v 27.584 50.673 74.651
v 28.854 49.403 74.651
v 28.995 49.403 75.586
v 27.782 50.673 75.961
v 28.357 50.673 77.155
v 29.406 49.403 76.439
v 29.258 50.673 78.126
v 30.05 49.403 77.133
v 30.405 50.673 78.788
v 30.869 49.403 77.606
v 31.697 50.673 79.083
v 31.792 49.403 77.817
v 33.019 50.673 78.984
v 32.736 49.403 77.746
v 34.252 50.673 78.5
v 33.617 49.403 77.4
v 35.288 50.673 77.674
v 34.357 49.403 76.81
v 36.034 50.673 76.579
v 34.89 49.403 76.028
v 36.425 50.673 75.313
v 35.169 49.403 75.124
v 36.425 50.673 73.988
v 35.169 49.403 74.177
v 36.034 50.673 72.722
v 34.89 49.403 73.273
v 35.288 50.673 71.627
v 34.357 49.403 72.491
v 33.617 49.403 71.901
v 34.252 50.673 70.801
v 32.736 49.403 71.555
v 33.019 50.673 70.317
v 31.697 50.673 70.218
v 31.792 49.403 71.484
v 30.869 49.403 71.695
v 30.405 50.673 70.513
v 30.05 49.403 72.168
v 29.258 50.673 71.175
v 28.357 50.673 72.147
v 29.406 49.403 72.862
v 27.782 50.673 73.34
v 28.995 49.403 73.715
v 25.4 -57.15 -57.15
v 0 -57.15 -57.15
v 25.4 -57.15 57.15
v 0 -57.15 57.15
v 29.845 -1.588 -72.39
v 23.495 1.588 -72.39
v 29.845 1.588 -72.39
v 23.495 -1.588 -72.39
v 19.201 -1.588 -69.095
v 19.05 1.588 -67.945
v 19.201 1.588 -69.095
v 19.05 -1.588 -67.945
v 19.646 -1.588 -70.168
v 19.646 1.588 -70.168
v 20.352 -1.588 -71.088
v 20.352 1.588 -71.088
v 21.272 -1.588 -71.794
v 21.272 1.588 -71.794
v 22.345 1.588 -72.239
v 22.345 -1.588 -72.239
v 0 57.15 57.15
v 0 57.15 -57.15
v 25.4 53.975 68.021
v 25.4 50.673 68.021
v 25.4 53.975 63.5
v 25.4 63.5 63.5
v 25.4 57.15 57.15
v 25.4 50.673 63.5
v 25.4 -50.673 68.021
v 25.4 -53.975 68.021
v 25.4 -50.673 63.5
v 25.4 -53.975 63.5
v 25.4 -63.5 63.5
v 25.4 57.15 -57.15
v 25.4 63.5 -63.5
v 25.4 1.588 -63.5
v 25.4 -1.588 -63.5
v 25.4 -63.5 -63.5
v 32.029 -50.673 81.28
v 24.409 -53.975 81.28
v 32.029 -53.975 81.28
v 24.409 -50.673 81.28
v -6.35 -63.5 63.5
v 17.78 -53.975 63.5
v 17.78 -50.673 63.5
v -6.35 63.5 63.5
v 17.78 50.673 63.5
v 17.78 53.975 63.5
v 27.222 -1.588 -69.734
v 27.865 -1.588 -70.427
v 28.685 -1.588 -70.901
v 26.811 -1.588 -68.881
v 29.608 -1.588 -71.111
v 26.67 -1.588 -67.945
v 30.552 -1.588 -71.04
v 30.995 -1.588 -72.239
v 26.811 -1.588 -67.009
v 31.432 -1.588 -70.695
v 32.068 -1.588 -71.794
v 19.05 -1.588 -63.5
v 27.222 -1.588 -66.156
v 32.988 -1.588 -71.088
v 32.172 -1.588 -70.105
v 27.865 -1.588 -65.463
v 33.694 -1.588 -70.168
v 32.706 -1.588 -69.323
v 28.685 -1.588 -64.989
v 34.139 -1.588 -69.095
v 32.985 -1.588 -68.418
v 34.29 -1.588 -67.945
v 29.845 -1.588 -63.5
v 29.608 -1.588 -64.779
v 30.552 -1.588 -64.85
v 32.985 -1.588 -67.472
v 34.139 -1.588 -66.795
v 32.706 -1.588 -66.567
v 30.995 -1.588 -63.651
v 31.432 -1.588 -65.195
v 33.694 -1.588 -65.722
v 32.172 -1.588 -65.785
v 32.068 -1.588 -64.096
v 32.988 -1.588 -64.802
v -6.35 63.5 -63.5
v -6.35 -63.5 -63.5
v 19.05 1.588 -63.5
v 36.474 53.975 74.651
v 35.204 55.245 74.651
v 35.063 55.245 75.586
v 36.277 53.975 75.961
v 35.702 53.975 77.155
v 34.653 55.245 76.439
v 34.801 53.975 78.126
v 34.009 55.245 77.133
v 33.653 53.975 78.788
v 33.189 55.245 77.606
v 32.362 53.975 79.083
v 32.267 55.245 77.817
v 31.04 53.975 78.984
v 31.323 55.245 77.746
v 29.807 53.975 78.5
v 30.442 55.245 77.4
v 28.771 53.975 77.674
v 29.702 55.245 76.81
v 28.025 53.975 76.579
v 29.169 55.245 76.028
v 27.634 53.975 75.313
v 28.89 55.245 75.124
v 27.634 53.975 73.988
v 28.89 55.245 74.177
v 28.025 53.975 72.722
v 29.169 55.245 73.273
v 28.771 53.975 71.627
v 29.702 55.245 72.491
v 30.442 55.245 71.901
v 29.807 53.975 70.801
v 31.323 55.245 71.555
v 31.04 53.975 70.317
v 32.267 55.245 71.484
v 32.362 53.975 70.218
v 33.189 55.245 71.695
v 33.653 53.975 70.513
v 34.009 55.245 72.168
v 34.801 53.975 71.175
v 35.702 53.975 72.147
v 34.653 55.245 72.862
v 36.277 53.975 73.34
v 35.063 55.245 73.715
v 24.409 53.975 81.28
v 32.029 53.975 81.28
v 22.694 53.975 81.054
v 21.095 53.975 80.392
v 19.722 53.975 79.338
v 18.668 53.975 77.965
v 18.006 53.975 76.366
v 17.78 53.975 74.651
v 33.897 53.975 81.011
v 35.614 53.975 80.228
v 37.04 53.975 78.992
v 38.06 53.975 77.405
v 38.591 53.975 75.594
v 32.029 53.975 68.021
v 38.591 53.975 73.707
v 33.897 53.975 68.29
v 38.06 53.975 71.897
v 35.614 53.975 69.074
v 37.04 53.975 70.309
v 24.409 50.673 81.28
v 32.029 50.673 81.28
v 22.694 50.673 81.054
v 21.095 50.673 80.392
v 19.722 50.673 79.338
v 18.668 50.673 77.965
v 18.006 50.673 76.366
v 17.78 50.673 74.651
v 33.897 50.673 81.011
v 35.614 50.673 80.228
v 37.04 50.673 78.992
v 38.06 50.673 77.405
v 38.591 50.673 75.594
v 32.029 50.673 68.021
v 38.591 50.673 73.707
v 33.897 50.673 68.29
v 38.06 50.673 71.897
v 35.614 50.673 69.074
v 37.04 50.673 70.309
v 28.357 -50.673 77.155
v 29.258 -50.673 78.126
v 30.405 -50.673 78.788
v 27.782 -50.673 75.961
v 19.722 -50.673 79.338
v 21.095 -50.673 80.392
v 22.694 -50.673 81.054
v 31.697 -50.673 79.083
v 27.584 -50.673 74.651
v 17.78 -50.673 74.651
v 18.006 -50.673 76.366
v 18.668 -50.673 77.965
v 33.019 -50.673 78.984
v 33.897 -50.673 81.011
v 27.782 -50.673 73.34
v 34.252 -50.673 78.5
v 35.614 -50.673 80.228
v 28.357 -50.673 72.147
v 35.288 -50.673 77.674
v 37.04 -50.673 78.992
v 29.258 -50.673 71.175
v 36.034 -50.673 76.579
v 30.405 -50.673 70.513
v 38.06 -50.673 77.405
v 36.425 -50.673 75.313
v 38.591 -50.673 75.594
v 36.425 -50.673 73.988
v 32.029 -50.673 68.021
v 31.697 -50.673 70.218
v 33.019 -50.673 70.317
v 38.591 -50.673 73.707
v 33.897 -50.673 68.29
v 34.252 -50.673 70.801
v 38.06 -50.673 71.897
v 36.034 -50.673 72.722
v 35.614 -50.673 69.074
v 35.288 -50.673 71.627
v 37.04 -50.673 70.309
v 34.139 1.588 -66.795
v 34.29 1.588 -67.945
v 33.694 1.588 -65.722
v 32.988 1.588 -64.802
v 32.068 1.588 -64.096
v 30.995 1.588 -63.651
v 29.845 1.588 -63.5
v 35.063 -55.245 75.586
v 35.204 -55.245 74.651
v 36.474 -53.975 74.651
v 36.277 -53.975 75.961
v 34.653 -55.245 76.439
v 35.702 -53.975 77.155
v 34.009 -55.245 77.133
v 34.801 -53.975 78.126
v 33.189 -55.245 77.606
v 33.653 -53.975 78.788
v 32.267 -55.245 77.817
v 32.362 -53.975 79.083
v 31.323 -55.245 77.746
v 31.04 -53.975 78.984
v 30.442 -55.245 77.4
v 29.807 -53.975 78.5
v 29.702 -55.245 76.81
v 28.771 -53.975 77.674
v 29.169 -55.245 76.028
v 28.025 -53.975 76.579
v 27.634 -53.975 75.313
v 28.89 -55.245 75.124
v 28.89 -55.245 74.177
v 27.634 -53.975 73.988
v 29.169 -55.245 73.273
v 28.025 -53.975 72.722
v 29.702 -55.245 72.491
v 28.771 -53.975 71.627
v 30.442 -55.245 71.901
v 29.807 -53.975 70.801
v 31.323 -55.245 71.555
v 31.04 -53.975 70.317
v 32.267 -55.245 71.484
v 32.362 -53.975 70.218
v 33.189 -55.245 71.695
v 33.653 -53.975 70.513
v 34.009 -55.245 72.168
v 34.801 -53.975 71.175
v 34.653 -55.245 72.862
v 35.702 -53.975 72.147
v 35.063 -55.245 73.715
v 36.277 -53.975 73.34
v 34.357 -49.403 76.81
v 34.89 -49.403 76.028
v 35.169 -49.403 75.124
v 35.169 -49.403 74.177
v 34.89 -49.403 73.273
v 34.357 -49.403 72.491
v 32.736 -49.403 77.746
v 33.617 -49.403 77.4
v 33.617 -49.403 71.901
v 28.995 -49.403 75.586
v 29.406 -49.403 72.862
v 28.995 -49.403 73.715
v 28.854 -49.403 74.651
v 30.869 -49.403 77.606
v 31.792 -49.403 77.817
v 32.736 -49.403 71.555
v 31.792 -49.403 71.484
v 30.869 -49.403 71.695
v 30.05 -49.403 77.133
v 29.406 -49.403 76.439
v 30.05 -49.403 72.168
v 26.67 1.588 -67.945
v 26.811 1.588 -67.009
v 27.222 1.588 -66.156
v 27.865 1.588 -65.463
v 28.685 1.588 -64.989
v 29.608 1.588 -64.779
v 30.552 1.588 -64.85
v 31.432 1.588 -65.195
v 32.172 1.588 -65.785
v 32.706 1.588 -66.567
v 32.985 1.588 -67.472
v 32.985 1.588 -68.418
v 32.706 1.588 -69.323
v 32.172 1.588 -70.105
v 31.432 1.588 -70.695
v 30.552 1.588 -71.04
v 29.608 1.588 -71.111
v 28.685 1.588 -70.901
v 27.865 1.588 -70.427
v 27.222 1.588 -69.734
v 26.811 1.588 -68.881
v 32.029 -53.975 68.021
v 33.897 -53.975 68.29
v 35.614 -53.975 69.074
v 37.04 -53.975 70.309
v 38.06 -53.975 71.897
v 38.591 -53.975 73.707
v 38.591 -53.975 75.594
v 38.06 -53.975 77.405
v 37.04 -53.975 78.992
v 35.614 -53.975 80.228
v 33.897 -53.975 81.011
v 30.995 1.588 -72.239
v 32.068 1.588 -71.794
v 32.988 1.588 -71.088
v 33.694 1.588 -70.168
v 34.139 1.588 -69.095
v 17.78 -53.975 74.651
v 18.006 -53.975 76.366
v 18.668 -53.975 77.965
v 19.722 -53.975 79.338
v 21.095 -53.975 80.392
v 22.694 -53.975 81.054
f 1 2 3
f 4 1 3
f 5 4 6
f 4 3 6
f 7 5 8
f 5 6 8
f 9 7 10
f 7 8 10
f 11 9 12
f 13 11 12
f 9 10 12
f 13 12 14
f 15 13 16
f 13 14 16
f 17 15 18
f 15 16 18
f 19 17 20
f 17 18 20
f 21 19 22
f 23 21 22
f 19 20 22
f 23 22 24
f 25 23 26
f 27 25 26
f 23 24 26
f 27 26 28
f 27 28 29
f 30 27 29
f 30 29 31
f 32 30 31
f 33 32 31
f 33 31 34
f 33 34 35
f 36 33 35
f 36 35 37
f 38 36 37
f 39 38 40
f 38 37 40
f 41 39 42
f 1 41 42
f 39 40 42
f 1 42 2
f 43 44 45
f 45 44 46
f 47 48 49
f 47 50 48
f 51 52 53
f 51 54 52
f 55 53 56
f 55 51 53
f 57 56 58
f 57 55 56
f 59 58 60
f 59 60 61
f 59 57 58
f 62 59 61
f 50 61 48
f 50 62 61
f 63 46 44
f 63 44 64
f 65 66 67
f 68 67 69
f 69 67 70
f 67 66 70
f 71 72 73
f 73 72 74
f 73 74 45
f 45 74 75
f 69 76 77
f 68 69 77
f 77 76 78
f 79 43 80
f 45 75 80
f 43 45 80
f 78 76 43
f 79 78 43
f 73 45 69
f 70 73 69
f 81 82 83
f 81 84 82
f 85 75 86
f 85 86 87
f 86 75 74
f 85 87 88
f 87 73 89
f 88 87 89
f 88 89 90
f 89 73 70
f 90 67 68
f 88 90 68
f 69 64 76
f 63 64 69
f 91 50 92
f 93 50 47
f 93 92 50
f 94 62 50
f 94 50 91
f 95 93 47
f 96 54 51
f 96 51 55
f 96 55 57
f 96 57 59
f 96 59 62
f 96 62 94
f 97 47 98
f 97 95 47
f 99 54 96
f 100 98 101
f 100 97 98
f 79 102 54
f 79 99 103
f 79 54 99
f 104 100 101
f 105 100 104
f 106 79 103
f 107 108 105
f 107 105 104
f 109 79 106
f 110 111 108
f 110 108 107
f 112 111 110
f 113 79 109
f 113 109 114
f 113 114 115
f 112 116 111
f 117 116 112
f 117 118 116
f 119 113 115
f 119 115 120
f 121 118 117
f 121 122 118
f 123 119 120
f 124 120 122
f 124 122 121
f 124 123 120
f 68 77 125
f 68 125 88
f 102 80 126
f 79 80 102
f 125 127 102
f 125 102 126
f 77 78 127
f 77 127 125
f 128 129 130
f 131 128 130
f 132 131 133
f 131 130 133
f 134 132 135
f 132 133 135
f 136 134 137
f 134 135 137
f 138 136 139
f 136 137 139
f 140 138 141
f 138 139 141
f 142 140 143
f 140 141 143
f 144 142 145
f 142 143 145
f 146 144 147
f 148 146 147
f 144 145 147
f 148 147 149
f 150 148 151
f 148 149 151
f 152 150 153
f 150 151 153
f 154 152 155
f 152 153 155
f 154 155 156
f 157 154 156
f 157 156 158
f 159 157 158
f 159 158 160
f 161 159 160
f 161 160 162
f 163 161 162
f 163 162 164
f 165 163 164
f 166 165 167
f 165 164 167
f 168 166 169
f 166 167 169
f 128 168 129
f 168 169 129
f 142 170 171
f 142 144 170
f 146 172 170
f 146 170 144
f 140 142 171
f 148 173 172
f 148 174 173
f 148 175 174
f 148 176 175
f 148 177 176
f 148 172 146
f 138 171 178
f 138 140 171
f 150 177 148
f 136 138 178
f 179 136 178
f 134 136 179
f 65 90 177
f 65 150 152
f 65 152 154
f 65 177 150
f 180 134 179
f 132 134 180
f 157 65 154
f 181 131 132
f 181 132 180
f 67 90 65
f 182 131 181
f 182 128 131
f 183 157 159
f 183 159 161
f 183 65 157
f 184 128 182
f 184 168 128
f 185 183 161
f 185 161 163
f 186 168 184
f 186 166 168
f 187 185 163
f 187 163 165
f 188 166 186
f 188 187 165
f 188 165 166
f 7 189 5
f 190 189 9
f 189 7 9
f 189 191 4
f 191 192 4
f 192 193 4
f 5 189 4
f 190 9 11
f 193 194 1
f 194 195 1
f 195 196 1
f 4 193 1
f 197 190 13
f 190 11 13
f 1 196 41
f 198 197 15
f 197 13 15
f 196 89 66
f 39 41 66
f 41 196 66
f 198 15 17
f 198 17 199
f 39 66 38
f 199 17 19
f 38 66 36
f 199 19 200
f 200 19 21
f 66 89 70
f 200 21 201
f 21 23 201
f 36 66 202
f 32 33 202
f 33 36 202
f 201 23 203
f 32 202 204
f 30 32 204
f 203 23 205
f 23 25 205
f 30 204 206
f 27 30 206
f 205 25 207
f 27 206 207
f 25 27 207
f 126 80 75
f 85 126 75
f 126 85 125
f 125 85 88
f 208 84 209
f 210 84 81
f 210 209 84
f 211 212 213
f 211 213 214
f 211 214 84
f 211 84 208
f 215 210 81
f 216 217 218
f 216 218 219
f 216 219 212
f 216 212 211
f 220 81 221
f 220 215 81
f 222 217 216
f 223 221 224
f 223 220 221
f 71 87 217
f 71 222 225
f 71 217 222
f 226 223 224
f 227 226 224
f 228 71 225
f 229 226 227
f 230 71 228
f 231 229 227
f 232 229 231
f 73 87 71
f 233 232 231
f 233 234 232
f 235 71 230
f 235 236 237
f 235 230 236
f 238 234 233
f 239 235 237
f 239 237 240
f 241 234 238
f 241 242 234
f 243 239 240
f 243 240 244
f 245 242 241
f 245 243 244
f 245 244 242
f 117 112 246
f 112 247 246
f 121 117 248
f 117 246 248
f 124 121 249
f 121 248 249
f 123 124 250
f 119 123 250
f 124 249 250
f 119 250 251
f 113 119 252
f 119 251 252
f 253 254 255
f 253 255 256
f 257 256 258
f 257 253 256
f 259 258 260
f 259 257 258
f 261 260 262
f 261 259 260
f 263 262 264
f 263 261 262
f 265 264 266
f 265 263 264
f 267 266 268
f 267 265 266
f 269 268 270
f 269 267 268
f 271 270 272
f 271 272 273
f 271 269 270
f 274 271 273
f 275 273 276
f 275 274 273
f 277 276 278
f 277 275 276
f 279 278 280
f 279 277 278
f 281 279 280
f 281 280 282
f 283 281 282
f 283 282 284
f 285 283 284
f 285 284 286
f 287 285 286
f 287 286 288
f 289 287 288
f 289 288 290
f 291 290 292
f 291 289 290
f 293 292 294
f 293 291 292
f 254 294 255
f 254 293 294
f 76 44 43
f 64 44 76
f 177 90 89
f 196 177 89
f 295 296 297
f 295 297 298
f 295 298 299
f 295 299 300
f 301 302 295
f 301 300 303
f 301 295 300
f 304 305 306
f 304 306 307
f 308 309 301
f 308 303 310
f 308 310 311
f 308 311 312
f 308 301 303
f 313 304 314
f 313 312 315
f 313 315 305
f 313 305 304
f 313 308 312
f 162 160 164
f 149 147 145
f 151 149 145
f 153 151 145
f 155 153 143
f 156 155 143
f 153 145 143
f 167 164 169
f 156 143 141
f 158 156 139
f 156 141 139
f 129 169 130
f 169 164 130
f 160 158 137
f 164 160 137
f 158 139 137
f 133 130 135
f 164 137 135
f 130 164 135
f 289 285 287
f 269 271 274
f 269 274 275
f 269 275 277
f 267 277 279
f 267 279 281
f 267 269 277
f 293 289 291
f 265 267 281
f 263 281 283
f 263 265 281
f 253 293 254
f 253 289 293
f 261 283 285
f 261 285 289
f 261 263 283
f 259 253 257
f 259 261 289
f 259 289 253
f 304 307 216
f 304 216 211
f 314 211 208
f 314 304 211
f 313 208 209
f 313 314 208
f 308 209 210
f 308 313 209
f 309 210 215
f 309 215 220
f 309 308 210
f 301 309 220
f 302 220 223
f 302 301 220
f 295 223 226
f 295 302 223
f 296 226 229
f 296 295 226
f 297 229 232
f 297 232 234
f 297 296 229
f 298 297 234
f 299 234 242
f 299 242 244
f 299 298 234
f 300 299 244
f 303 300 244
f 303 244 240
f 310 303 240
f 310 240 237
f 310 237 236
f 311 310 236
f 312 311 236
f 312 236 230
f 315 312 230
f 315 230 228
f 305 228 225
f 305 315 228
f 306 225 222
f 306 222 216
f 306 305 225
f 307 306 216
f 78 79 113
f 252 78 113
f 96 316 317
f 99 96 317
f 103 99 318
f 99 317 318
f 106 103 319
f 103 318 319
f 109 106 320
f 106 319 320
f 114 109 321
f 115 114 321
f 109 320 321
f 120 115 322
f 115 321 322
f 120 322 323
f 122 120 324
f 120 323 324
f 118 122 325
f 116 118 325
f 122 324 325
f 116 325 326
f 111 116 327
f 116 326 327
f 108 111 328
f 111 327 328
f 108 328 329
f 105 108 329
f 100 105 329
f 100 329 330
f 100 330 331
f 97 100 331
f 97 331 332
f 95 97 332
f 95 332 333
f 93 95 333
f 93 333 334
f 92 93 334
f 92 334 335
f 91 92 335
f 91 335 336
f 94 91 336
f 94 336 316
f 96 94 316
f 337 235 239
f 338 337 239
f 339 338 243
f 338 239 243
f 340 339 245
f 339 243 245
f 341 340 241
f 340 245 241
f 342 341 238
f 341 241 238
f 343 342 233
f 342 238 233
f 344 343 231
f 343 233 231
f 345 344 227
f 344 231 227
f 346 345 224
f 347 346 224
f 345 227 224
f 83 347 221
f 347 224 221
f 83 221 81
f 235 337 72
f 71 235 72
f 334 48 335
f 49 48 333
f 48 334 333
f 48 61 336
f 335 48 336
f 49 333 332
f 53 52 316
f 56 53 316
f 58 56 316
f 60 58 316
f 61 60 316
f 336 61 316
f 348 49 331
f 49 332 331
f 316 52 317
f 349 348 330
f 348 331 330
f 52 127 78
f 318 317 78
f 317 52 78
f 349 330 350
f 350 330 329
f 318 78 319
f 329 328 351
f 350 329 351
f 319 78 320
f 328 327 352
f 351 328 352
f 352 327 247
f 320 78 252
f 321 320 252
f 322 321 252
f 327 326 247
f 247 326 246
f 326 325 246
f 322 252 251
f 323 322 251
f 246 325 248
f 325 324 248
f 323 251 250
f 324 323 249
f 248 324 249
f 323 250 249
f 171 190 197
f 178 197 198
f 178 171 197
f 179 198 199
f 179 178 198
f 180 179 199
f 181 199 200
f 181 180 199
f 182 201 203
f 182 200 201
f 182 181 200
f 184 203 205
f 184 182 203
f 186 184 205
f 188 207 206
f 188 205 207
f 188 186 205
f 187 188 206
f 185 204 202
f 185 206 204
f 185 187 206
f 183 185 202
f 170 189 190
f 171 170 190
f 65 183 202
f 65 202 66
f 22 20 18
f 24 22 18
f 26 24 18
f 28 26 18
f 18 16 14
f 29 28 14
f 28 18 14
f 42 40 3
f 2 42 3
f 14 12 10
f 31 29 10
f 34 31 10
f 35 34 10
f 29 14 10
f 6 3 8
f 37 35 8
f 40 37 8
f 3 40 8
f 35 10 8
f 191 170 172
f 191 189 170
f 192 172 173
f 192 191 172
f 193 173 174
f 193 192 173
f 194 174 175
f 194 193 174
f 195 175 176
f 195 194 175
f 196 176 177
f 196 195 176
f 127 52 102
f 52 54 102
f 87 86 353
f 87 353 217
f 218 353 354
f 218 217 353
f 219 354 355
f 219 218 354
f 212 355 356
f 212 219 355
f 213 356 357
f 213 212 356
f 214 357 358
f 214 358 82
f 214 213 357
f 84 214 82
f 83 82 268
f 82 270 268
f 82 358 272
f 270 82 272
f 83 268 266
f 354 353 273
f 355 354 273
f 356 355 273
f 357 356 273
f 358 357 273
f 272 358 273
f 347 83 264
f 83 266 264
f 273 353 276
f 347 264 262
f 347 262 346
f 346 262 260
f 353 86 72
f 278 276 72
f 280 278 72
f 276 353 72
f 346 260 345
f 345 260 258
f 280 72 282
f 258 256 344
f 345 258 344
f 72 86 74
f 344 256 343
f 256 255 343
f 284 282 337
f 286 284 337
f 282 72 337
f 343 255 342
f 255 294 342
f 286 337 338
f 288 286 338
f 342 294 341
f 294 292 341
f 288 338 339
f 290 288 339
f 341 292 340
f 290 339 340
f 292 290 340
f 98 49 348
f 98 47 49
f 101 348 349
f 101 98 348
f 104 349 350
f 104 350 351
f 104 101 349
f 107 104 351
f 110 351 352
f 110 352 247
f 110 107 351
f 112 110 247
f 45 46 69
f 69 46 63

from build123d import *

# Parameters (mm, degrees)
F0_W      = 127
F0_H      = 127
F0_W_2    = 114.3
F0_H_2    = 114.3
F1_DEPTH  = 25.4
F2_W      = 127
F2_H      = 127
F3_DEPTH  = 6.35
F4_W      = 20.8788
F4_H      = 3.302
F5_DEPTH  = 17.78
F6_R      = 6.6294
F8_DEPTH  = 6.35
F9_R      = 6.6294
F10_R     = 4.445
F11_DEPTH = 1.27
F12_R     = 4.445
F13_DEPTH = 1.27
F14_SIZE  = 1.26999
F15_W     = 15.24
F15_H     = 8.89
F16_DEPTH = 1.5875
F17_R     = 4.44499
F18_R     = 3.175
F19_DEPTH = 25.4


# Not quite as in the source:
# - a fillet or chamfer is up to 0.001 mm smaller than in the source, because OpenCascade refuses the exact size
# - a pattern or mirror of a feature is missing from the dataset's text; its kind, count and spacing are read off the source's solid


with BuildPart() as f1:
    # F0 (on Right) → F1 (new body)
    with BuildSketch(Plane.YZ):
        Rectangle(F0_W, F0_H)
        Rectangle(F0_W_2, F0_H_2, mode=Mode.SUBTRACT)
    extrude(amount=F1_DEPTH)

    # F2 (on Right) → F3 (join)
    with BuildSketch(Plane.YZ):
        Rectangle(F2_W, F2_H)
    extrude(amount=-F3_DEPTH)

    # F4 (on face) → F5 (join)
    with BuildSketch(Plane.XY.offset(63.5)):
        with Locations((28.2194, -52.324)):
            Rectangle(F4_W, F4_H)
    f5 = extrude(amount=F5_DEPTH)

    # F5_copies: F5 across plane
    add(f5.mirror(Plane.ZX))

    # F6
    f6_edges = [f1.edges().sort_by_distance(p)[0] for p in [
        (38.6588, -52.324, 81.28),
    ]]
    fillet(f6_edges, radius=F6_R)

    # F7 (on face) → F8 (cut)
    with BuildSketch(Plane.XZ.offset(53.975)):
        with BuildLine():
            ThreePointArc((32.0294, 81.28), (38.6588, 74.6506), (32.0294, 68.0212))
            Line((32.0294, 68.0212), (25.4, 68.0212))
            Line((25.4, 68.0212), (25.4, 63.5))
            Line((25.4, 63.5), (41.4029210806, 57.3826394975))
            Line((41.4029210806, 57.3826394975), (43.7219925225, 87.7940133214))
            Line((43.7219925225, 87.7940133214), (32.0294, 81.28))
        make_face()
    f8 = extrude(amount=-F8_DEPTH, mode=Mode.SUBTRACT)

    # F8_copies: F8 across plane
    add(f8.mirror(Plane.ZX), mode=Mode.SUBTRACT)

    # F9
    f9_edges = [f1.edges().sort_by_distance(p)[0] for p in [
        (17.78, -52.324, 81.28),
        (17.78, 52.324, 81.28),
    ]]
    fillet(f9_edges, radius=F9_R)

    # F10 (on face) → F11 (join)
    with BuildSketch(Plane.XZ.offset(53.975)):
        with Locations((32.0294, 74.6506)):
            Circle(F10_R)
    f11 = extrude(amount=F11_DEPTH)

    # F11_copies: F11 across plane
    add(f11.mirror(Plane.ZX))

    # F12 (on face) → F13 (join)
    with BuildSketch(Plane(origin=(0, -50.673, 0), x_dir=(-1, 0, 0), z_dir=(0, 1, 0))):
        with Locations((-32.0294, 74.6506)):
            Circle(F12_R)
    f13 = extrude(amount=F13_DEPTH)

    # F13_copies: F13 across plane
    add(f13.mirror(Plane.ZX))

    # F14 (size 1.27 in the source; OpenCascade refuses exactly that, so slightly less here)
    f14_edges = [f1.edges().sort_by_distance(p)[0] for p in [
        (27.5844, -55.245, 74.6506),
        (36.4744, -49.403, 74.6506),
        (27.5844, 55.245, 74.6506),
        (36.4744, 49.403, 74.6506),
    ]]
    chamfer(f14_edges, length=F14_SIZE)

    # F15 (on Front) → F16 (join, symmetric)
    with BuildSketch(Plane.XZ):
        with Locations((26.67, -67.945)):
            Rectangle(F15_W, F15_H)
    extrude(amount=F16_DEPTH, both=True)

    # F17 (radius 4.445 in the source; OpenCascade refuses exactly that, so slightly less here)
    f17_edges = [f1.edges().sort_by_distance(p)[0] for p in [
        (34.29, 0, -63.5),
        (34.29, 0, -72.39),
        (19.05, 0, -72.39),
    ]]
    fillet(f17_edges, radius=F17_R)

    # F18 (on face) → F19 (cut)
    with BuildSketch(Plane(origin=(0, 1.5875, 0), x_dir=(-1, 0, 0), z_dir=(0, 1, 0))):
        with Locations((-29.845, -67.945)):
            Circle(F18_R)
    extrude(amount=-F19_DEPTH, mode=Mode.SUBTRACT)


solid = f1.part
